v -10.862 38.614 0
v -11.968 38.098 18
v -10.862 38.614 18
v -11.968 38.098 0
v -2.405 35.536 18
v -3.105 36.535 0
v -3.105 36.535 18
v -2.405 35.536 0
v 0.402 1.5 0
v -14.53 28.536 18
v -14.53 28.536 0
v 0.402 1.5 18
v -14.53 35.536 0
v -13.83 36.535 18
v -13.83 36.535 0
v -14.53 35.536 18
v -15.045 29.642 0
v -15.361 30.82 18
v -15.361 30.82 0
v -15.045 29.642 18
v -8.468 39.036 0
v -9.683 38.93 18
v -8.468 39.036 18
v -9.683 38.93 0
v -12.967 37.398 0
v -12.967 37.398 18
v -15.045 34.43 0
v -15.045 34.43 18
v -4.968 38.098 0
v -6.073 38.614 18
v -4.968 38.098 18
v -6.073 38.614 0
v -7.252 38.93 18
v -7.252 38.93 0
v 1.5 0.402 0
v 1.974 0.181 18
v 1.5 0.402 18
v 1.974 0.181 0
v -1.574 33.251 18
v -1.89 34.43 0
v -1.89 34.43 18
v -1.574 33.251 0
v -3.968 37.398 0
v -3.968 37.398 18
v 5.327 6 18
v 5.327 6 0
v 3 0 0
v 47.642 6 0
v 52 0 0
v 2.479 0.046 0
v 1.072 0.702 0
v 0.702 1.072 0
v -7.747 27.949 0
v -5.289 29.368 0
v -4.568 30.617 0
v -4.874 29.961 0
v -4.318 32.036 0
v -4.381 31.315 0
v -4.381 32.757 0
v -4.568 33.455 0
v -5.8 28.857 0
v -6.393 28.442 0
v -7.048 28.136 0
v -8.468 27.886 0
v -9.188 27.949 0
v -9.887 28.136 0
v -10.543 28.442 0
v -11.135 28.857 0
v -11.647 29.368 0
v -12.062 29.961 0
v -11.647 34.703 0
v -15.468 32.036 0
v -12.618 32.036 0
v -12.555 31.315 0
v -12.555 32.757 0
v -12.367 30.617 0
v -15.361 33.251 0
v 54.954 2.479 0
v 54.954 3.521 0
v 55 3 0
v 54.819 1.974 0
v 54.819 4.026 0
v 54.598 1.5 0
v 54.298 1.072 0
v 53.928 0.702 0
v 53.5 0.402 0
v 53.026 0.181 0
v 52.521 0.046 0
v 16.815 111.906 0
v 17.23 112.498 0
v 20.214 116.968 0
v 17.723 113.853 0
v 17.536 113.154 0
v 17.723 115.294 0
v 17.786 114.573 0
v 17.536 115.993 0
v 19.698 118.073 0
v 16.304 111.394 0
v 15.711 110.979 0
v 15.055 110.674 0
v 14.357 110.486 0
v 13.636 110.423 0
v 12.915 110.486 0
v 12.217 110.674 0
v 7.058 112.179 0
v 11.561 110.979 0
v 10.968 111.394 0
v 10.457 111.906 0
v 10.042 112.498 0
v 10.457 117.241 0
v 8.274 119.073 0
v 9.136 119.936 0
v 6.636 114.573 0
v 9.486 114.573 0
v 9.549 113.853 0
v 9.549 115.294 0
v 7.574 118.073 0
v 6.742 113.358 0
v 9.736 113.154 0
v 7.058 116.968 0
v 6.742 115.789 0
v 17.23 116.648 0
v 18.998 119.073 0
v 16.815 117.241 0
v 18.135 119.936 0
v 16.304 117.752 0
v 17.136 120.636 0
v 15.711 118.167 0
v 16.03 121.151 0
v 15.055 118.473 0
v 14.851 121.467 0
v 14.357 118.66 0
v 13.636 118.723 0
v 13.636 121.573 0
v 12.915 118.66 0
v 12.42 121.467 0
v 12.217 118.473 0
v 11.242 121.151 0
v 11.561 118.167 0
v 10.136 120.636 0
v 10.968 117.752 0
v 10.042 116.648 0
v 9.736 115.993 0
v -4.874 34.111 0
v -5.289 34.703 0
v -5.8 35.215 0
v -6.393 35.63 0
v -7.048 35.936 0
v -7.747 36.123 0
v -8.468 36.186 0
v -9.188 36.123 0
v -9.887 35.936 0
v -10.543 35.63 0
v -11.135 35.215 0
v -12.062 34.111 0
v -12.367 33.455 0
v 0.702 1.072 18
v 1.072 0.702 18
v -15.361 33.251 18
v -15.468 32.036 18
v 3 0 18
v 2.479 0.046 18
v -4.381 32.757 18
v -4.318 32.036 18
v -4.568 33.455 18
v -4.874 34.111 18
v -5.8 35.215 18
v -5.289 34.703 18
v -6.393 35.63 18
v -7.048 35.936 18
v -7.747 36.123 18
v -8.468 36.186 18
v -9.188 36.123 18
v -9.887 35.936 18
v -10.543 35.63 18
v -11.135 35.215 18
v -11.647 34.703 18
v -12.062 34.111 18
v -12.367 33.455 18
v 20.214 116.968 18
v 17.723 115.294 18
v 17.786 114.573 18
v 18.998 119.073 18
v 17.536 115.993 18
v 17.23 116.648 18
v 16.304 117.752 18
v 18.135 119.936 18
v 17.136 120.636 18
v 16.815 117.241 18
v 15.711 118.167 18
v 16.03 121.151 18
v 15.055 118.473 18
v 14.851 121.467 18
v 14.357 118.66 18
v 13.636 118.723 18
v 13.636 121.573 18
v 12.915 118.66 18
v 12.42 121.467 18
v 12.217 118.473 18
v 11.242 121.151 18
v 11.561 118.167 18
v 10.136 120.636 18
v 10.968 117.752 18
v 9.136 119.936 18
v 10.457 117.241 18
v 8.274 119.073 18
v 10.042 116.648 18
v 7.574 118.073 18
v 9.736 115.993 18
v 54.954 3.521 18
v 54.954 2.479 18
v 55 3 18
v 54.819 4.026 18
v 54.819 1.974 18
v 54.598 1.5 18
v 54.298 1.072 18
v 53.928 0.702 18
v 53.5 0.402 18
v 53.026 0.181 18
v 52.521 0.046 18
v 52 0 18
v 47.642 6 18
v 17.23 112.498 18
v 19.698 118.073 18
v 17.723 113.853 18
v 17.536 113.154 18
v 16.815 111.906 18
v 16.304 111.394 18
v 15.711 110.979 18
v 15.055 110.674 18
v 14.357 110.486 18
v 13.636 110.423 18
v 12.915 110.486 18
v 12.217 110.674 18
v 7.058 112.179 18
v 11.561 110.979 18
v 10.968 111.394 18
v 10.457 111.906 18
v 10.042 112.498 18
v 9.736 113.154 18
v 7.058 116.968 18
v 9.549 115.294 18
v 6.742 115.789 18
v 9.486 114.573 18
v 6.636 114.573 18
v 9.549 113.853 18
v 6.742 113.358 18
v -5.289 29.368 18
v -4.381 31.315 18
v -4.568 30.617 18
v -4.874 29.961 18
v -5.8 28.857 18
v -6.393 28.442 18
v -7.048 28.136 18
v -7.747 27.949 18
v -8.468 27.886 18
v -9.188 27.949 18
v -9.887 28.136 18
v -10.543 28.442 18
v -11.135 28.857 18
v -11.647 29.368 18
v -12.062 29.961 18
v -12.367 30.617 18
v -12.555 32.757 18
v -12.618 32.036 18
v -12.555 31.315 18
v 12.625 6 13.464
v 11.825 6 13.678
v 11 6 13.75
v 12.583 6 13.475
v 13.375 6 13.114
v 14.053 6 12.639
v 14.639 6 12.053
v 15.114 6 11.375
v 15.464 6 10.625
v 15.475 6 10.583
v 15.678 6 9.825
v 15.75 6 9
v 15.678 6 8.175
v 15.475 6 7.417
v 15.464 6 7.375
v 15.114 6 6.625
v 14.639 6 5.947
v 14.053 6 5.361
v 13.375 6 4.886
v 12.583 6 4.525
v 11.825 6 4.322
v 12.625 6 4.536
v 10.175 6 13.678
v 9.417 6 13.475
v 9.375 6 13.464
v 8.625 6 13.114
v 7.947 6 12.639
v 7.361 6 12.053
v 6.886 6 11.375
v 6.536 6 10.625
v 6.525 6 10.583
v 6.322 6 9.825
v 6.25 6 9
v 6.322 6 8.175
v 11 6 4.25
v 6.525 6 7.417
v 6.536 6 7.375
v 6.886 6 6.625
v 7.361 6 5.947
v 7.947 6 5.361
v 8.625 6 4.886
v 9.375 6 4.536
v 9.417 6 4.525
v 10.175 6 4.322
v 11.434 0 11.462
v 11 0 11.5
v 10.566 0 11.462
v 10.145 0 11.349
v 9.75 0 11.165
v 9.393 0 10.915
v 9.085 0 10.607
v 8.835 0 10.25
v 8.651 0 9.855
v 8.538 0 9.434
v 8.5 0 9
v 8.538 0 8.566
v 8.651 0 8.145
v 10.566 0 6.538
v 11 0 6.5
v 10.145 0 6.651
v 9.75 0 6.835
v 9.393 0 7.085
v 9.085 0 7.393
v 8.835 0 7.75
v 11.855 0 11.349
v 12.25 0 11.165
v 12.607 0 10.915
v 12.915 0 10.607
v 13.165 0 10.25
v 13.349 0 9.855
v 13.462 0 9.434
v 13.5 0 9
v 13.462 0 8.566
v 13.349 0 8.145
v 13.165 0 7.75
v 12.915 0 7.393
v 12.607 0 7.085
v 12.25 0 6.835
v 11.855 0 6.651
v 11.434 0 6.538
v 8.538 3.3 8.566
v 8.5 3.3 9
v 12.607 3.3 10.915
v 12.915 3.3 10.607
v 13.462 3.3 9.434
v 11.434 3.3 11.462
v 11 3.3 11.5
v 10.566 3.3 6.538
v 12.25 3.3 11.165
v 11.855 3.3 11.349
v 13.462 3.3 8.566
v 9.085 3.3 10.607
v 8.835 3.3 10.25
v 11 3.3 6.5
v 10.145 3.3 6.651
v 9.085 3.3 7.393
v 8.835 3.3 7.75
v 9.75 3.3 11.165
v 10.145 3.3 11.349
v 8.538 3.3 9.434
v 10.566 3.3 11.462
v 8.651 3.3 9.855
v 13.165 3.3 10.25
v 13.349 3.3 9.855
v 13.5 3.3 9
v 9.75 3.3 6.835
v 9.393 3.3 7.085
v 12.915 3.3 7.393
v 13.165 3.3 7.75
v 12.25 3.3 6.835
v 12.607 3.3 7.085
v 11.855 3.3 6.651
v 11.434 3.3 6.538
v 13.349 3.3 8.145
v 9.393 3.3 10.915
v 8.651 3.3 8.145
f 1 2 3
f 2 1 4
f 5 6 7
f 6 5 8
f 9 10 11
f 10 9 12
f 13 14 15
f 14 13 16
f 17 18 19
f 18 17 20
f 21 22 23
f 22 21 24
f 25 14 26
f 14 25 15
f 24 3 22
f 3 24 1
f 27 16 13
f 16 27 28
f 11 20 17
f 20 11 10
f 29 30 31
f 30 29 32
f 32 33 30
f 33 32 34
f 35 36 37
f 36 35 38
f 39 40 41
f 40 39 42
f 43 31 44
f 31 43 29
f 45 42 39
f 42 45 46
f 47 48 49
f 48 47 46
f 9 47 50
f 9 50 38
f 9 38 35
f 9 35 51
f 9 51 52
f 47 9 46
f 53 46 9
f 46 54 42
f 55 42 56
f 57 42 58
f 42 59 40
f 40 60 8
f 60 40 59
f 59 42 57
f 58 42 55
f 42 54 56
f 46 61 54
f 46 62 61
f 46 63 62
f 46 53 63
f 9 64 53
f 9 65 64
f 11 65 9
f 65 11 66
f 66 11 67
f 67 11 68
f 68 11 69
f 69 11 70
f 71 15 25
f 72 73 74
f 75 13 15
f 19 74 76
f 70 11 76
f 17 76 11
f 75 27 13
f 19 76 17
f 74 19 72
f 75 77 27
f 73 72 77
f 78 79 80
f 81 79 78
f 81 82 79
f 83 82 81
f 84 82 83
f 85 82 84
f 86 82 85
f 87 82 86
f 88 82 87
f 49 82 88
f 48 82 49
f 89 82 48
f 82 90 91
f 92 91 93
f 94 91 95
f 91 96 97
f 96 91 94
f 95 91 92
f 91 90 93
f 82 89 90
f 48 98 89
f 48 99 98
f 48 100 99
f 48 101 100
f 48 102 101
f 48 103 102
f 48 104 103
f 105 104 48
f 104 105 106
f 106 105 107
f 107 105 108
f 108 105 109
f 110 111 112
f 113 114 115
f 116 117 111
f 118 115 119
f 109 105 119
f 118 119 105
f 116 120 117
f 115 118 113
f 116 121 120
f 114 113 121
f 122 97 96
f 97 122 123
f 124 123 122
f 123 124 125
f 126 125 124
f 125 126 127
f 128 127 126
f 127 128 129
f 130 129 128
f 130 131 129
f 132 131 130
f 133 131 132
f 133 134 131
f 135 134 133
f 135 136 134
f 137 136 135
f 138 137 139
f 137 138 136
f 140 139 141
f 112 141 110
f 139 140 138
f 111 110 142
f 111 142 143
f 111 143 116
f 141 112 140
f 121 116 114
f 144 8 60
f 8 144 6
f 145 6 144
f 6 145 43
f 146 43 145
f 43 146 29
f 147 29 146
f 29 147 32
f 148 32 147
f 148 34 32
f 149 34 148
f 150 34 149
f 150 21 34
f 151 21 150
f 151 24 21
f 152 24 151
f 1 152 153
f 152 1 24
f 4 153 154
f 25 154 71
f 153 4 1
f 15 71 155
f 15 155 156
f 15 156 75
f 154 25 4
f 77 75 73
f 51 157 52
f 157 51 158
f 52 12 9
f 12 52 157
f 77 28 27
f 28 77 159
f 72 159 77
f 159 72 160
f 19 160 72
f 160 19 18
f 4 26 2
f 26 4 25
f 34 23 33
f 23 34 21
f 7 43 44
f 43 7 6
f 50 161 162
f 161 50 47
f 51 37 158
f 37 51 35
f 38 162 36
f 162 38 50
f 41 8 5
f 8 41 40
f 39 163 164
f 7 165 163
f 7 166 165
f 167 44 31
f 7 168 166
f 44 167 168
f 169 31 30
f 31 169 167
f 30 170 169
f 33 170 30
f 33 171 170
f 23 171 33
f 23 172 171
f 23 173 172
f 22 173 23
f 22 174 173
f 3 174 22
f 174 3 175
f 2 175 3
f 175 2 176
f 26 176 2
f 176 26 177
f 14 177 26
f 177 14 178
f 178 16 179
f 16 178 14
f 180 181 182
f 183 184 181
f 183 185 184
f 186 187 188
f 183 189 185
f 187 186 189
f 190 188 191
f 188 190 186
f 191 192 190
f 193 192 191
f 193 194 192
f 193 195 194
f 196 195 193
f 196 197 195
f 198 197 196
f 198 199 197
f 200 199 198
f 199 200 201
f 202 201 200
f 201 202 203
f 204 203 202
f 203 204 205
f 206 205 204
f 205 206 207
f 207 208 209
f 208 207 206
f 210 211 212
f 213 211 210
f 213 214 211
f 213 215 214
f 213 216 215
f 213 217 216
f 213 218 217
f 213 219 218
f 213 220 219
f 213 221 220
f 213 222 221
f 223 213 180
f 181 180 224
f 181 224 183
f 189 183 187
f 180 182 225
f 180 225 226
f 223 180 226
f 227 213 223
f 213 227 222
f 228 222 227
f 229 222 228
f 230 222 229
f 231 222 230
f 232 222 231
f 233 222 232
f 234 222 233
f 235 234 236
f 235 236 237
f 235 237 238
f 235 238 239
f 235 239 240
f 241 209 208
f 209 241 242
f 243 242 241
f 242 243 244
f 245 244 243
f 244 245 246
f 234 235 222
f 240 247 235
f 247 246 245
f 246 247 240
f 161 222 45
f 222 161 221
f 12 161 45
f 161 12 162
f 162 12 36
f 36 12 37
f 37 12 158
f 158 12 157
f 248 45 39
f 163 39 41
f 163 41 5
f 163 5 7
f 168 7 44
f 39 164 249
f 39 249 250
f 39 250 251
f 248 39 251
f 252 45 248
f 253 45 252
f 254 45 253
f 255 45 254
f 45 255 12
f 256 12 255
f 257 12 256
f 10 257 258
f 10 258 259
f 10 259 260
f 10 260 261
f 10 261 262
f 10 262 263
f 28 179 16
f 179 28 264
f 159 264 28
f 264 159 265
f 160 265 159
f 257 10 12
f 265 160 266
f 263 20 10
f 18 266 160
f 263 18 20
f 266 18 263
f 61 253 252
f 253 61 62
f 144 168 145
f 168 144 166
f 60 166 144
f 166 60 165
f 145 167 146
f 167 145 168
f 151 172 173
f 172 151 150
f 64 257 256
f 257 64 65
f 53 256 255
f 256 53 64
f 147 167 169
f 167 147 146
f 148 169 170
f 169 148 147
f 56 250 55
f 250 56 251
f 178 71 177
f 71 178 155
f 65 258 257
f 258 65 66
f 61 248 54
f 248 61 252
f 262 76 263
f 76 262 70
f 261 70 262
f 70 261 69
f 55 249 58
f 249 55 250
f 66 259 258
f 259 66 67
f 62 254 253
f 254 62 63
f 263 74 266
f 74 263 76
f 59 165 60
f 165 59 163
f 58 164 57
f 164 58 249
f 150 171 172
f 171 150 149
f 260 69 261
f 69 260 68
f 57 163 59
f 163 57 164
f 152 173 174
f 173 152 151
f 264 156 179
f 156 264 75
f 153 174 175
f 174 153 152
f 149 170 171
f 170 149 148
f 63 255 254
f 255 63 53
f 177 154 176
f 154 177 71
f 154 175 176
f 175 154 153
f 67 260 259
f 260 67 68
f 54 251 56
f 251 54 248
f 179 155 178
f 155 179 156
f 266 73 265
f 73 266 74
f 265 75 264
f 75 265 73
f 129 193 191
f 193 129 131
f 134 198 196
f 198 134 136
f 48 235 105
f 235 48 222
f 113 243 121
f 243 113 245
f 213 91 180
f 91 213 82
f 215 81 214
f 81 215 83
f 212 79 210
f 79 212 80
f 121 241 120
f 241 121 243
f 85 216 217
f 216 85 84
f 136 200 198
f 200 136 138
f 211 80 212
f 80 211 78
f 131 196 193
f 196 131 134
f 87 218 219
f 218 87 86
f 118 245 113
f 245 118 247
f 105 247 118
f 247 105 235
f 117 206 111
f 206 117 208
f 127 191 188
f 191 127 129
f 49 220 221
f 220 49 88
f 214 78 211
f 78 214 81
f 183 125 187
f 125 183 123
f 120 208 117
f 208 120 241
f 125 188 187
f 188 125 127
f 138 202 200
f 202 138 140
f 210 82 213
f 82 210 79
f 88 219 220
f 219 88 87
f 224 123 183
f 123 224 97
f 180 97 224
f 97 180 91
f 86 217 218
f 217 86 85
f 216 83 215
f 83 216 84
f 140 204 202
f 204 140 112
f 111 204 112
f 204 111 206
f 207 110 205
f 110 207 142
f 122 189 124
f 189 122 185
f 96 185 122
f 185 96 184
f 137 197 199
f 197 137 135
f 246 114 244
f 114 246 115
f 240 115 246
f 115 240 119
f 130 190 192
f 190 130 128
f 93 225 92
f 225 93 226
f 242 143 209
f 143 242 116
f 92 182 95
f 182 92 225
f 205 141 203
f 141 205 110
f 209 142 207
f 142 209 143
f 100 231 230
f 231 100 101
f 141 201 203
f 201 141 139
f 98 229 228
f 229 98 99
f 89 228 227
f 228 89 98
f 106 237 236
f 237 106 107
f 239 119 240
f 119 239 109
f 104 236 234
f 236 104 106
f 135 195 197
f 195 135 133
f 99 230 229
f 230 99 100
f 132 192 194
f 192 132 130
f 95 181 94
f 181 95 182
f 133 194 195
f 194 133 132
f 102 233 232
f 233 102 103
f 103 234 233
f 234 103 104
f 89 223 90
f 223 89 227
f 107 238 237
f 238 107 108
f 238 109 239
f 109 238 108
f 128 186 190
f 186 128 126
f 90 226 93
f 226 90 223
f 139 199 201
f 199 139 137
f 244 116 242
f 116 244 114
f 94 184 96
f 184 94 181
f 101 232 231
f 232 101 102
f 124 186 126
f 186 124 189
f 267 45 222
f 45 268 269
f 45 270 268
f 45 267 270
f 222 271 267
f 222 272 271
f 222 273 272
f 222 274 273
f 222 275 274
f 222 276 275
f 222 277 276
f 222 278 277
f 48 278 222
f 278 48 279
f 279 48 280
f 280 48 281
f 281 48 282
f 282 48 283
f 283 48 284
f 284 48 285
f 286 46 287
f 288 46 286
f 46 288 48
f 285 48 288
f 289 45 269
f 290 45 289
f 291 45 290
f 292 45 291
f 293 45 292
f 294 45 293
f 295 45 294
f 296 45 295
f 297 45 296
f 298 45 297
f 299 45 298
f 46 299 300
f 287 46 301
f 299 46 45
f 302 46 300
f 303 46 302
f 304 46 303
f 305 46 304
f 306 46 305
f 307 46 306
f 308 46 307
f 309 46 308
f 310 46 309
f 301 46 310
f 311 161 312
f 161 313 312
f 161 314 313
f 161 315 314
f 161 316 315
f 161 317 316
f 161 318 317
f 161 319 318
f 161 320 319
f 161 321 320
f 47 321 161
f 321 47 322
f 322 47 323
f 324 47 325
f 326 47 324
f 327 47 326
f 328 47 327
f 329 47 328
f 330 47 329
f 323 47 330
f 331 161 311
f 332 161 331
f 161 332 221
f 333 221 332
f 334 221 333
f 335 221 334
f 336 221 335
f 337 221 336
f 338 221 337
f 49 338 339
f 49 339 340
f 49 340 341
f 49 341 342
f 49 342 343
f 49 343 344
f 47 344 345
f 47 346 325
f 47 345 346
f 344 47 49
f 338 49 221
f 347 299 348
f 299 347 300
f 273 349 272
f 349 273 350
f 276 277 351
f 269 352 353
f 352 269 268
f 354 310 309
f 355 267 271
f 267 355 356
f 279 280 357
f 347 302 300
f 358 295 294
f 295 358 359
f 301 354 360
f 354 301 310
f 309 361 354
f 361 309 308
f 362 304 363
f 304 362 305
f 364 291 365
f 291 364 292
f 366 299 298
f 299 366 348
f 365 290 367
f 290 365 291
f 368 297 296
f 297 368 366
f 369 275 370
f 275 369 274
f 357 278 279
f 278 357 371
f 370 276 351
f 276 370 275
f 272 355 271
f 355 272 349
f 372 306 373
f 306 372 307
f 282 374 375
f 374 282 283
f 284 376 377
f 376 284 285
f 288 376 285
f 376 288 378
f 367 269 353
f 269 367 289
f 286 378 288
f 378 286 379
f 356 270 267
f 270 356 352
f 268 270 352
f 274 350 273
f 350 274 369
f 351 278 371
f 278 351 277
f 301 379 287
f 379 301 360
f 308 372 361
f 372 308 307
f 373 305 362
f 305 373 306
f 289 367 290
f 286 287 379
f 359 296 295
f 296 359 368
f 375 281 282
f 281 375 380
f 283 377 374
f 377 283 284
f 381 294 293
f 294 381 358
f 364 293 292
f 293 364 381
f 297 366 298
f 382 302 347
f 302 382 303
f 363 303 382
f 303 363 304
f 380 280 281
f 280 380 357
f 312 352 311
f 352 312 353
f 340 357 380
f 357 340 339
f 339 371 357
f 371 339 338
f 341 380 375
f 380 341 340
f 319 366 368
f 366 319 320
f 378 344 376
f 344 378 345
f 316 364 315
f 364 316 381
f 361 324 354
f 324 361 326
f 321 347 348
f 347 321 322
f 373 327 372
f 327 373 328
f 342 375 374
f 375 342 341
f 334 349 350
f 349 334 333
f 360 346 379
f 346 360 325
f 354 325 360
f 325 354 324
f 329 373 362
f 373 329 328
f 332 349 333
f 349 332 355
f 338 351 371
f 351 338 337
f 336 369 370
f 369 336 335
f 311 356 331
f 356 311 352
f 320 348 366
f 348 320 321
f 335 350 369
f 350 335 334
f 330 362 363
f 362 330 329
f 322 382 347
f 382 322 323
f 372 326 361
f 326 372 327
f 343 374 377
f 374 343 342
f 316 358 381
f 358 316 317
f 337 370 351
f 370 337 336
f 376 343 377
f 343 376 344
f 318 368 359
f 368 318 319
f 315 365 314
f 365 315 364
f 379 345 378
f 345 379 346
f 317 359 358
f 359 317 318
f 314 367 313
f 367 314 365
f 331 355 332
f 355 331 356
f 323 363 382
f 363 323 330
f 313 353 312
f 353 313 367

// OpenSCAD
/* [Global] */

// preview[view:north west, tilt:top diagonal]

// Smoothness
$fn = 36;		// [92:Ultimate,36:Smooth,12:Edgy,6:Hexagonal,5:Pentagonal]

/* [Object look and feel] */

// Height of the object on the print platform
fatness = 18; // [10:300]

// Length of the top holder
length_upper =  30; // [20:Mini,30:Standard,40:Large]

// Length of the bottom holder
length_lower = 100; // [85:Mini,100:Standard,120:Large]

// Wall thickness
wall_thickness = 6; // [3:Slim,6:Standard,12:Heavy]

// Height of the object
rack_height = 55; // [50:Mini,55:Standard,60:Large]

// Angle of the holders
rack_angle = 20; // [0:Flat,15:Low,20:Normal,30:Steep,45:Wrapped]

/* [Rod parameters] */

// Rod diameter (more than 10 may be too heavy)
rod_d    =   8; // [6,7,8,9,10,11,12,14,16,18,20]

// Hole closure
closure  = "none"; // [none,left,right]

/* [Screw sizing] */

// Screw diameter
sroub_r  =   5; // [5,6,7,8]

// Screw head diameter
sroub_h  =  10; // [10,11,12,13,15]

// Screw type
screw_type = "recessed"; // [recessed,flat]

/* [Hidden] */
// Screw length
sroub_l  =  30;
fudge    =   0.3;

odstup = (rack_height / 5 > wall_thickness) ? (rack_height / 5) : (wall_thickness);

module zaslepka() {
  color("orange") cylinder(r = rod_d / 2 + fudge, h = fatness / 3);
}

module zaslepky() {
  rotate([0, 0, rack_angle]) translate([rack_height - wall_thickness / 2, wall_thickness / 2 + length_lower, 0])
    zaslepka();
  rotate([0, 0, rack_angle]) translate([wall_thickness / 2, wall_thickness / 2 + length_upper, 0])
    zaslepka();
}

module dira_tycky() {
  translate([0, 0, -fudge])
    cylinder(r = rod_d / 2 + fudge / 2, h = fatness + 2*fudge);
}

module tycka() {
  difference() {
    cylinder(r = (rod_d + wall_thickness) / 2, h = fatness);
    dira_tycky();
  }
}

module rack(closed) {
  translate([wall_thickness / 2, 0, 0])
    cube([rack_height - wall_thickness, wall_thickness, fatness]);

  difference() {
    hull() {
      translate([wall_thickness / 2, wall_thickness / 2, 0])
        cylinder(r=wall_thickness / 2, h = fatness);
      rotate([0, 0, rack_angle]) translate([wall_thickness / 2, wall_thickness / 2 + length_upper, 0])
        tycka();
    }
    rotate([0, 0, rack_angle]) translate([wall_thickness / 2, wall_thickness / 2 + length_upper, 0])
      dira_tycky();
  }

  difference() {
    hull() {
      translate([rack_height - wall_thickness / 2, wall_thickness / 2, 0])
        cylinder(r=wall_thickness / 2, h = fatness);
      rotate([0, 0, rack_angle]) translate([rack_height - wall_thickness / 2, wall_thickness / 2 + length_lower, 0])
        tycka();
     }
    rotate([0, 0, rack_angle]) translate([rack_height - wall_thickness / 2, wall_thickness / 2 + length_lower, 0])
      dira_tycky();
  }

  if (closed == "right") {
    zaslepky();
  }
  if (closed == "left") {
    translate([0, 0, fatness / 3 * 2]) zaslepky();
  }
}

module hole() {
  rotate([-90, 0, 0]) {
    cylinder(r = sroub_r / 2, h = sroub_l);
    if (screw_type == "recessed") {
      translate([0, 0, sroub_l / 10 * 9])
        cylinder(r1 = sroub_r / 2, r2 = sroub_h / 2, h = sroub_l / 10);
      translate([0, 0, sroub_l])
        cylinder(r = sroub_h / 2, h = 1);
    } else {
      translate([0, 0, sroub_l / 10 * 9])
        cylinder(r = sroub_h / 2, h = sroub_l / 3);
    }
  }
}

module rack_dira(closed = closure) {
  difference() {
  rack(closed);
    # translate([odstup, wall_thickness + fudge - sroub_l, fatness / 2])
      hole();
  }
}

module anotherone() {
  translate([0, 0, 200]) 
    rack_dira(closed = "right");
}

module centerone() {
  translate([0, 0, 100 - fatness / 2]) 
    rack_dira(closed = "none");
}

module poles() {
  rotate([0, 0, rack_angle]) translate([wall_thickness / 2, wall_thickness / 2 + length_upper, fatness / 3]) cylinder(r=rod_d / 2, h = 200 + fatness - fatness / 3 * 2);
  rotate([0, 0, rack_angle]) translate([rack_height - wall_thickness / 2, wall_thickness / 2 + length_lower, fatness / 3]) cylinder(r=rod_d / 2, h = 200 + fatness - fatness / 3 * 2);
}

rack_dira();
